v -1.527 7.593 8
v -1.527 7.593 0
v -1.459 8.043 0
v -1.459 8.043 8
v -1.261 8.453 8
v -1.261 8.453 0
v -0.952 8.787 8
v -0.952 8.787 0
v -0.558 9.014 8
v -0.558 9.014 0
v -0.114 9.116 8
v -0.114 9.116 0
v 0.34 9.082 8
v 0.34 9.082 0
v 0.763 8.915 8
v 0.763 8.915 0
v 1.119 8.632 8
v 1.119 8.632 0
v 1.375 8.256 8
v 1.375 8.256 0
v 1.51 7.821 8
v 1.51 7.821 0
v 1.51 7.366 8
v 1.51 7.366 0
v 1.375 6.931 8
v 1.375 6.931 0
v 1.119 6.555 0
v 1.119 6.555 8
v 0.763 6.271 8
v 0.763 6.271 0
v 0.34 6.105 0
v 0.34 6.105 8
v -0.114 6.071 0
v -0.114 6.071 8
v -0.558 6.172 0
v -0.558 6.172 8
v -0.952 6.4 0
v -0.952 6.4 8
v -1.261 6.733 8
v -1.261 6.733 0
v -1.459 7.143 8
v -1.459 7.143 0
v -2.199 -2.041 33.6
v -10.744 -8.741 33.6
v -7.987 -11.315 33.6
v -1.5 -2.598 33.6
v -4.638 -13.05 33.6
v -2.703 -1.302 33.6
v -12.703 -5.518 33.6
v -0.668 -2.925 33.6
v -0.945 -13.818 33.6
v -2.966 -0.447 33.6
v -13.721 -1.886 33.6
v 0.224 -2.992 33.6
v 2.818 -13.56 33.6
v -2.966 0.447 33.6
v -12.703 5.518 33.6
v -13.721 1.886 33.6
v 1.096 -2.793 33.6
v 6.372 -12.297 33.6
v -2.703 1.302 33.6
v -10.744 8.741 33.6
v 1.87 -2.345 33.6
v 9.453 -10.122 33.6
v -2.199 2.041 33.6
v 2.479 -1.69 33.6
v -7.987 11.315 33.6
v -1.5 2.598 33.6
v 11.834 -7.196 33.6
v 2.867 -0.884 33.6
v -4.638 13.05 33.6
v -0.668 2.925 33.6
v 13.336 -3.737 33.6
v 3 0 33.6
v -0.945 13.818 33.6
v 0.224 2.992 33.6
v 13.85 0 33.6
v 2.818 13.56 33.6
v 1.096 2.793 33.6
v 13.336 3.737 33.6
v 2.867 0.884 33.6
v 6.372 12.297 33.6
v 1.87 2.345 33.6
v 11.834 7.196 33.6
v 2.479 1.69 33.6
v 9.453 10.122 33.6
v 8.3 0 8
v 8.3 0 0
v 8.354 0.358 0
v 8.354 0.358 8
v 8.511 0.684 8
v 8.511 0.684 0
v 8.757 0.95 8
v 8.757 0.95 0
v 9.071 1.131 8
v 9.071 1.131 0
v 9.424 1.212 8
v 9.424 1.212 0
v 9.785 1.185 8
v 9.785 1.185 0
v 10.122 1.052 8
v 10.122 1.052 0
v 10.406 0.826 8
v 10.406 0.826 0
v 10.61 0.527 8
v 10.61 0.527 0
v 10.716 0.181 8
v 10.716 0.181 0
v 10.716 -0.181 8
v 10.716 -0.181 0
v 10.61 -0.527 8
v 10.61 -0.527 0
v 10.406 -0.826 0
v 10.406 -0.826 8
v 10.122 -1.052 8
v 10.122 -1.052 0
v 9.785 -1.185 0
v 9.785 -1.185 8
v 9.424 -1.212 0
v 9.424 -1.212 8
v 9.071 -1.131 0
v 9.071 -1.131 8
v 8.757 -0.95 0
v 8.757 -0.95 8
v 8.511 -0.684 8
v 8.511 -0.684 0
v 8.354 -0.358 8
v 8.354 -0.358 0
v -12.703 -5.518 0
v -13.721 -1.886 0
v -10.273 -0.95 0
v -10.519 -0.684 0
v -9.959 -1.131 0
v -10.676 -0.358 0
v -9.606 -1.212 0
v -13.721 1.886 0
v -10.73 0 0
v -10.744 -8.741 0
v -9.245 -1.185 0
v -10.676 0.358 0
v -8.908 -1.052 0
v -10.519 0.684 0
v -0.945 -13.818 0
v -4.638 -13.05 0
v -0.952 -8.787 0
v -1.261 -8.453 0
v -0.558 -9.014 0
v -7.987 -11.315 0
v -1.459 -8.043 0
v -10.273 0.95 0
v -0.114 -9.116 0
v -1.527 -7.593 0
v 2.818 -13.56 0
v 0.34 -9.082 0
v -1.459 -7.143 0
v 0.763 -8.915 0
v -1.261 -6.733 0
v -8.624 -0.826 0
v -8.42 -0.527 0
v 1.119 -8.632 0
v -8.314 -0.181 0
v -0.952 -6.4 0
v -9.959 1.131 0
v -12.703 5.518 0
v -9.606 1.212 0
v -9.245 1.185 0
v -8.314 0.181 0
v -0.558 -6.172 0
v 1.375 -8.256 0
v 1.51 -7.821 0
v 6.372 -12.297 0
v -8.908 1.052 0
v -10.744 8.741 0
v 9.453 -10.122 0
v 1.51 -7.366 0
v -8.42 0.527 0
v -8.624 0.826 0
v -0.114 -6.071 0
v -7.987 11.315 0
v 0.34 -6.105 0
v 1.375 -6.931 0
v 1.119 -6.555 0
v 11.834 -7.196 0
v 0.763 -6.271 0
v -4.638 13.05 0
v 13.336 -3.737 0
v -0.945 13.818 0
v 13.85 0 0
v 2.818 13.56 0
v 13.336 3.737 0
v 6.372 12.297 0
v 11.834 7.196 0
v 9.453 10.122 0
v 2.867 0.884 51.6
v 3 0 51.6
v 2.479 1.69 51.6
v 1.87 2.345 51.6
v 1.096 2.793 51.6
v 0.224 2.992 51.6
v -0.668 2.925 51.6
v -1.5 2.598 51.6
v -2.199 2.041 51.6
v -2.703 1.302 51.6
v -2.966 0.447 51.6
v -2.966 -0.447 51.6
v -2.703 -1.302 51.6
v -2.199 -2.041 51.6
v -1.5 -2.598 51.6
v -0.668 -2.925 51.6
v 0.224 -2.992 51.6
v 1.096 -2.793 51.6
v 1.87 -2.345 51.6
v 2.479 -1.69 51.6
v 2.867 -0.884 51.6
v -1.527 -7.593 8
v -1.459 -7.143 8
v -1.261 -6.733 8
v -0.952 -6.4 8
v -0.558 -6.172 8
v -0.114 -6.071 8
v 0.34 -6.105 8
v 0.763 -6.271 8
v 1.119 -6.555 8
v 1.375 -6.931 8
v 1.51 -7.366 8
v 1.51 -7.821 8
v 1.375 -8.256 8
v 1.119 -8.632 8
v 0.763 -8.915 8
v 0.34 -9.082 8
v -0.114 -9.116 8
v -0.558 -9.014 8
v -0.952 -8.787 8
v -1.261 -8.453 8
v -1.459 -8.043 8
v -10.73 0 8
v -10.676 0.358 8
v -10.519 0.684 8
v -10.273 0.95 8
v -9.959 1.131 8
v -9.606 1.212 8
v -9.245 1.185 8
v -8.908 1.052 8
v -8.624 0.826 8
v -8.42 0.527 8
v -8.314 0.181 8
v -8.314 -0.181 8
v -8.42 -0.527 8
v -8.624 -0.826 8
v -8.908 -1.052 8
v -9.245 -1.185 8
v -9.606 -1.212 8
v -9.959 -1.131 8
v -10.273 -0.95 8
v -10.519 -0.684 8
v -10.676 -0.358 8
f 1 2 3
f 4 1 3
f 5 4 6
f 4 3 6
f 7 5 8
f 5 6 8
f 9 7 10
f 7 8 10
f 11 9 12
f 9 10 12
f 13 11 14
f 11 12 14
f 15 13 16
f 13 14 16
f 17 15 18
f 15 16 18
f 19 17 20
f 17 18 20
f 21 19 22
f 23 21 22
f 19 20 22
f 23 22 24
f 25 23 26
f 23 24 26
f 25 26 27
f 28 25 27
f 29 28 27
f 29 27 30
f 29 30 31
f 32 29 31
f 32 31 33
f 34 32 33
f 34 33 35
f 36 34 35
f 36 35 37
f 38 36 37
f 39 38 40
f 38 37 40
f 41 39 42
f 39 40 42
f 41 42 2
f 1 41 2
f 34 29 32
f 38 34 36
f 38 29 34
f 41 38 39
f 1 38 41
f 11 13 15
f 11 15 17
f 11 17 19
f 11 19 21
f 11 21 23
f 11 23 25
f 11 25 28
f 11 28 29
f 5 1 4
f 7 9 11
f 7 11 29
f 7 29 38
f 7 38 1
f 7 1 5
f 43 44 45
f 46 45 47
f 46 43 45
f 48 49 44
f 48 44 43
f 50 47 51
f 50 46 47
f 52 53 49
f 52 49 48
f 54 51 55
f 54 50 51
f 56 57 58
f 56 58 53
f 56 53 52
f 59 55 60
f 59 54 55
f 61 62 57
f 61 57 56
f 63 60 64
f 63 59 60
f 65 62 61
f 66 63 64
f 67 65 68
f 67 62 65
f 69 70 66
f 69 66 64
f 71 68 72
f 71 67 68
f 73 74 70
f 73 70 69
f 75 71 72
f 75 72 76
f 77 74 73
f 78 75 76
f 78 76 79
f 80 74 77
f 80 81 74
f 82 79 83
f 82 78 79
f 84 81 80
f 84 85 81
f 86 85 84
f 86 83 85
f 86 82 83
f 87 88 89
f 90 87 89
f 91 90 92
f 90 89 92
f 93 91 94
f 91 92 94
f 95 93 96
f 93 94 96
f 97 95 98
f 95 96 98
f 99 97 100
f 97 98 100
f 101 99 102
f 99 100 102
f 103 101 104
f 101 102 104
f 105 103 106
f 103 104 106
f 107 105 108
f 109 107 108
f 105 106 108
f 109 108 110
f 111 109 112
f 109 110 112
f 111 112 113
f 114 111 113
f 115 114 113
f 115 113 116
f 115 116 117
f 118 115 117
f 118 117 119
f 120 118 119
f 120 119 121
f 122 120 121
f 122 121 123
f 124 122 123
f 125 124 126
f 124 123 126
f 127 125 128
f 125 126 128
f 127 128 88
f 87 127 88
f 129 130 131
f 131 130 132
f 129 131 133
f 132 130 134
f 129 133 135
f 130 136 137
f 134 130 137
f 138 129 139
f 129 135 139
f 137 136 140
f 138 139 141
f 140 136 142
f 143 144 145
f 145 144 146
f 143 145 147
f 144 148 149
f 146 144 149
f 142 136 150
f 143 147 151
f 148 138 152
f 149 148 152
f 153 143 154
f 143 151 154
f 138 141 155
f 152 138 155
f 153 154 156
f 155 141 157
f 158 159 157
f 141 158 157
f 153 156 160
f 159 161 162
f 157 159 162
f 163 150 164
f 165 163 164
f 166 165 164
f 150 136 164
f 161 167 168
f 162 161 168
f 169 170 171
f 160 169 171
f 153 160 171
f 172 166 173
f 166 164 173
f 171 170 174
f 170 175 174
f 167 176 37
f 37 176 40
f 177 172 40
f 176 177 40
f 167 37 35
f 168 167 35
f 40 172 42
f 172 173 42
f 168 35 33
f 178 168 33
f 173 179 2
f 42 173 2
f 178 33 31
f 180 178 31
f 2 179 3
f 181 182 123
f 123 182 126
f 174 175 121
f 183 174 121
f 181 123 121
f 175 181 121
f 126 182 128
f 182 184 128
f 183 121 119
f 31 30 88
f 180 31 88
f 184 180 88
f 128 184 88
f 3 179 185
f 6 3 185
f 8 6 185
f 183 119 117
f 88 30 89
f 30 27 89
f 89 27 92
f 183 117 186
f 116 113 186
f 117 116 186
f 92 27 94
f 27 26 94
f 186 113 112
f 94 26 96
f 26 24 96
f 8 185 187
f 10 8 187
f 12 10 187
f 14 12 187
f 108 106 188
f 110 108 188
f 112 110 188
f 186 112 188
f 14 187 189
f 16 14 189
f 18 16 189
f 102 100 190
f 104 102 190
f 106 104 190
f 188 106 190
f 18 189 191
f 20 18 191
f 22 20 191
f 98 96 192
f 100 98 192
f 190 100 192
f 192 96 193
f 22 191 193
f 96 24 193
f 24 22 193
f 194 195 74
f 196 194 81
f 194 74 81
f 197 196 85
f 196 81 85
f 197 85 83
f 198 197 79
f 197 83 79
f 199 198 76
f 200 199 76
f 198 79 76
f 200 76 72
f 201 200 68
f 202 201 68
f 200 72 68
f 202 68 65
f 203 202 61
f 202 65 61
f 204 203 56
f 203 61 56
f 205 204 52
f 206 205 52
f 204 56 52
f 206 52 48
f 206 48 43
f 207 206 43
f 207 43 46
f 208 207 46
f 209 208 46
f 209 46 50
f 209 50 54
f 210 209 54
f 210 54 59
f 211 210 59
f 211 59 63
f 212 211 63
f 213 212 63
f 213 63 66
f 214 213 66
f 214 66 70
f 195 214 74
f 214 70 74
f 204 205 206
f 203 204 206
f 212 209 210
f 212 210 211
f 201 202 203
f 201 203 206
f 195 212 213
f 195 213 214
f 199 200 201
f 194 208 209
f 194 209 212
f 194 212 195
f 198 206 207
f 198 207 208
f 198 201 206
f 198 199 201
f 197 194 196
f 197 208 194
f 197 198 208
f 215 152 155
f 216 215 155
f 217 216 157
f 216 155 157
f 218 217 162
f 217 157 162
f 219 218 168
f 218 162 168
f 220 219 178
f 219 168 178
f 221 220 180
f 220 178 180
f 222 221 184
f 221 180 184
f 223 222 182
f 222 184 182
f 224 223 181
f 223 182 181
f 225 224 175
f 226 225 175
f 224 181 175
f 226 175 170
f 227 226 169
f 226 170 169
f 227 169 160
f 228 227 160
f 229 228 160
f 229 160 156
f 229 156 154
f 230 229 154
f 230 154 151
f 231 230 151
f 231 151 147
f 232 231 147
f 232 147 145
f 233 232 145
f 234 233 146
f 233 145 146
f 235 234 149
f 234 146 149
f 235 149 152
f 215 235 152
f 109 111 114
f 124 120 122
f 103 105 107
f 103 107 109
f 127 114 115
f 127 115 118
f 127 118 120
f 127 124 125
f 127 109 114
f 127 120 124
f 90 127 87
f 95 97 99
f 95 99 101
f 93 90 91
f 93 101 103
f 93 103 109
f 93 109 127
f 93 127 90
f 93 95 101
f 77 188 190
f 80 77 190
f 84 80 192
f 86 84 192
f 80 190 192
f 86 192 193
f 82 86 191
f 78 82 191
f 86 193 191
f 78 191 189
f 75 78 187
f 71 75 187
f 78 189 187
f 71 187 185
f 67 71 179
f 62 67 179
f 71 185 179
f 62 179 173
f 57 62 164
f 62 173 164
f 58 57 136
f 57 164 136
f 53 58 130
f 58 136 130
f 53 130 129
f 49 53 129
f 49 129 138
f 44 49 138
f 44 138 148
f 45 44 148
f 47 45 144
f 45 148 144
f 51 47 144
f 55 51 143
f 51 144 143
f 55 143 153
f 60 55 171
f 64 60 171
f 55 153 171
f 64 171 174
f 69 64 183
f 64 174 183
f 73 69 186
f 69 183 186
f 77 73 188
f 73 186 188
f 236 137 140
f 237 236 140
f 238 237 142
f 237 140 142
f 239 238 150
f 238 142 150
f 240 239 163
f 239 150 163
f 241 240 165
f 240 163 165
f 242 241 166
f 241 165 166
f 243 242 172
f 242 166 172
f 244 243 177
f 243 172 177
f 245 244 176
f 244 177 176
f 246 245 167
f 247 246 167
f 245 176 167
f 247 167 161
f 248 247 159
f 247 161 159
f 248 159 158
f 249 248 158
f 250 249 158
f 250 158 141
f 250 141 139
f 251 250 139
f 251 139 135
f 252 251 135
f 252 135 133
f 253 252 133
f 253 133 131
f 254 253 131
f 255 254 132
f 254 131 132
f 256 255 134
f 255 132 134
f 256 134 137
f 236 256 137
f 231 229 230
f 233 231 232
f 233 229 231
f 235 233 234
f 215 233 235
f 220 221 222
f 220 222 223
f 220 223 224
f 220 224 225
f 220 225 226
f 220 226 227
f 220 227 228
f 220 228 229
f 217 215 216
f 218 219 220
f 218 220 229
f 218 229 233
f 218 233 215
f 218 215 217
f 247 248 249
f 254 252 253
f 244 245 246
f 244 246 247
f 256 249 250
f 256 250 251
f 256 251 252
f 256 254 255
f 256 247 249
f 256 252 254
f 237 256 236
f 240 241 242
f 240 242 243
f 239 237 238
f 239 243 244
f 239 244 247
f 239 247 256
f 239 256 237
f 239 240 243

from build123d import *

# Parameters (mm, degrees)
SKETCH1_R           = 13.85
BOSS_EXTRUDE1_DEPTH = 33.6
SKETCH2_R           = 3
BOSS_EXTRUDE2_DEPTH = 18
SKETCH4_R           = 1.215
SKETCH4_R_2         = 1.526666667
CUT_EXTRUDE1_DEPTH  = 8


with BuildPart() as part:
    # Sketch1 → Boss-Extrude1 (new body)
    with BuildSketch(Plane.XY):
        Circle(SKETCH1_R)
    extrude(amount=BOSS_EXTRUDE1_DEPTH)

    # Sketch2 → Boss-Extrude2 (add)
    with BuildSketch(Plane.XY.offset(33.6)):
        Circle(SKETCH2_R)
    extrude(amount=BOSS_EXTRUDE2_DEPTH)

    # Sketch4 → Cut-Extrude1 (cut)
    with BuildSketch(Plane(origin=(0, 0, 0), x_dir=(-1, 0, 0), z_dir=(0, 0, -1))):
        with Locations((-9.515, 0)):
            Circle(SKETCH4_R)
        with Locations((9.515, 0)):
            Circle(SKETCH4_R)
        with Locations((0, 7.593333333)):
            Circle(SKETCH4_R_2)
        with Locations((0, -7.593333333)):
            Circle(SKETCH4_R_2)
    extrude(amount=-CUT_EXTRUDE1_DEPTH, mode=Mode.SUBTRACT)


solid = part.part
